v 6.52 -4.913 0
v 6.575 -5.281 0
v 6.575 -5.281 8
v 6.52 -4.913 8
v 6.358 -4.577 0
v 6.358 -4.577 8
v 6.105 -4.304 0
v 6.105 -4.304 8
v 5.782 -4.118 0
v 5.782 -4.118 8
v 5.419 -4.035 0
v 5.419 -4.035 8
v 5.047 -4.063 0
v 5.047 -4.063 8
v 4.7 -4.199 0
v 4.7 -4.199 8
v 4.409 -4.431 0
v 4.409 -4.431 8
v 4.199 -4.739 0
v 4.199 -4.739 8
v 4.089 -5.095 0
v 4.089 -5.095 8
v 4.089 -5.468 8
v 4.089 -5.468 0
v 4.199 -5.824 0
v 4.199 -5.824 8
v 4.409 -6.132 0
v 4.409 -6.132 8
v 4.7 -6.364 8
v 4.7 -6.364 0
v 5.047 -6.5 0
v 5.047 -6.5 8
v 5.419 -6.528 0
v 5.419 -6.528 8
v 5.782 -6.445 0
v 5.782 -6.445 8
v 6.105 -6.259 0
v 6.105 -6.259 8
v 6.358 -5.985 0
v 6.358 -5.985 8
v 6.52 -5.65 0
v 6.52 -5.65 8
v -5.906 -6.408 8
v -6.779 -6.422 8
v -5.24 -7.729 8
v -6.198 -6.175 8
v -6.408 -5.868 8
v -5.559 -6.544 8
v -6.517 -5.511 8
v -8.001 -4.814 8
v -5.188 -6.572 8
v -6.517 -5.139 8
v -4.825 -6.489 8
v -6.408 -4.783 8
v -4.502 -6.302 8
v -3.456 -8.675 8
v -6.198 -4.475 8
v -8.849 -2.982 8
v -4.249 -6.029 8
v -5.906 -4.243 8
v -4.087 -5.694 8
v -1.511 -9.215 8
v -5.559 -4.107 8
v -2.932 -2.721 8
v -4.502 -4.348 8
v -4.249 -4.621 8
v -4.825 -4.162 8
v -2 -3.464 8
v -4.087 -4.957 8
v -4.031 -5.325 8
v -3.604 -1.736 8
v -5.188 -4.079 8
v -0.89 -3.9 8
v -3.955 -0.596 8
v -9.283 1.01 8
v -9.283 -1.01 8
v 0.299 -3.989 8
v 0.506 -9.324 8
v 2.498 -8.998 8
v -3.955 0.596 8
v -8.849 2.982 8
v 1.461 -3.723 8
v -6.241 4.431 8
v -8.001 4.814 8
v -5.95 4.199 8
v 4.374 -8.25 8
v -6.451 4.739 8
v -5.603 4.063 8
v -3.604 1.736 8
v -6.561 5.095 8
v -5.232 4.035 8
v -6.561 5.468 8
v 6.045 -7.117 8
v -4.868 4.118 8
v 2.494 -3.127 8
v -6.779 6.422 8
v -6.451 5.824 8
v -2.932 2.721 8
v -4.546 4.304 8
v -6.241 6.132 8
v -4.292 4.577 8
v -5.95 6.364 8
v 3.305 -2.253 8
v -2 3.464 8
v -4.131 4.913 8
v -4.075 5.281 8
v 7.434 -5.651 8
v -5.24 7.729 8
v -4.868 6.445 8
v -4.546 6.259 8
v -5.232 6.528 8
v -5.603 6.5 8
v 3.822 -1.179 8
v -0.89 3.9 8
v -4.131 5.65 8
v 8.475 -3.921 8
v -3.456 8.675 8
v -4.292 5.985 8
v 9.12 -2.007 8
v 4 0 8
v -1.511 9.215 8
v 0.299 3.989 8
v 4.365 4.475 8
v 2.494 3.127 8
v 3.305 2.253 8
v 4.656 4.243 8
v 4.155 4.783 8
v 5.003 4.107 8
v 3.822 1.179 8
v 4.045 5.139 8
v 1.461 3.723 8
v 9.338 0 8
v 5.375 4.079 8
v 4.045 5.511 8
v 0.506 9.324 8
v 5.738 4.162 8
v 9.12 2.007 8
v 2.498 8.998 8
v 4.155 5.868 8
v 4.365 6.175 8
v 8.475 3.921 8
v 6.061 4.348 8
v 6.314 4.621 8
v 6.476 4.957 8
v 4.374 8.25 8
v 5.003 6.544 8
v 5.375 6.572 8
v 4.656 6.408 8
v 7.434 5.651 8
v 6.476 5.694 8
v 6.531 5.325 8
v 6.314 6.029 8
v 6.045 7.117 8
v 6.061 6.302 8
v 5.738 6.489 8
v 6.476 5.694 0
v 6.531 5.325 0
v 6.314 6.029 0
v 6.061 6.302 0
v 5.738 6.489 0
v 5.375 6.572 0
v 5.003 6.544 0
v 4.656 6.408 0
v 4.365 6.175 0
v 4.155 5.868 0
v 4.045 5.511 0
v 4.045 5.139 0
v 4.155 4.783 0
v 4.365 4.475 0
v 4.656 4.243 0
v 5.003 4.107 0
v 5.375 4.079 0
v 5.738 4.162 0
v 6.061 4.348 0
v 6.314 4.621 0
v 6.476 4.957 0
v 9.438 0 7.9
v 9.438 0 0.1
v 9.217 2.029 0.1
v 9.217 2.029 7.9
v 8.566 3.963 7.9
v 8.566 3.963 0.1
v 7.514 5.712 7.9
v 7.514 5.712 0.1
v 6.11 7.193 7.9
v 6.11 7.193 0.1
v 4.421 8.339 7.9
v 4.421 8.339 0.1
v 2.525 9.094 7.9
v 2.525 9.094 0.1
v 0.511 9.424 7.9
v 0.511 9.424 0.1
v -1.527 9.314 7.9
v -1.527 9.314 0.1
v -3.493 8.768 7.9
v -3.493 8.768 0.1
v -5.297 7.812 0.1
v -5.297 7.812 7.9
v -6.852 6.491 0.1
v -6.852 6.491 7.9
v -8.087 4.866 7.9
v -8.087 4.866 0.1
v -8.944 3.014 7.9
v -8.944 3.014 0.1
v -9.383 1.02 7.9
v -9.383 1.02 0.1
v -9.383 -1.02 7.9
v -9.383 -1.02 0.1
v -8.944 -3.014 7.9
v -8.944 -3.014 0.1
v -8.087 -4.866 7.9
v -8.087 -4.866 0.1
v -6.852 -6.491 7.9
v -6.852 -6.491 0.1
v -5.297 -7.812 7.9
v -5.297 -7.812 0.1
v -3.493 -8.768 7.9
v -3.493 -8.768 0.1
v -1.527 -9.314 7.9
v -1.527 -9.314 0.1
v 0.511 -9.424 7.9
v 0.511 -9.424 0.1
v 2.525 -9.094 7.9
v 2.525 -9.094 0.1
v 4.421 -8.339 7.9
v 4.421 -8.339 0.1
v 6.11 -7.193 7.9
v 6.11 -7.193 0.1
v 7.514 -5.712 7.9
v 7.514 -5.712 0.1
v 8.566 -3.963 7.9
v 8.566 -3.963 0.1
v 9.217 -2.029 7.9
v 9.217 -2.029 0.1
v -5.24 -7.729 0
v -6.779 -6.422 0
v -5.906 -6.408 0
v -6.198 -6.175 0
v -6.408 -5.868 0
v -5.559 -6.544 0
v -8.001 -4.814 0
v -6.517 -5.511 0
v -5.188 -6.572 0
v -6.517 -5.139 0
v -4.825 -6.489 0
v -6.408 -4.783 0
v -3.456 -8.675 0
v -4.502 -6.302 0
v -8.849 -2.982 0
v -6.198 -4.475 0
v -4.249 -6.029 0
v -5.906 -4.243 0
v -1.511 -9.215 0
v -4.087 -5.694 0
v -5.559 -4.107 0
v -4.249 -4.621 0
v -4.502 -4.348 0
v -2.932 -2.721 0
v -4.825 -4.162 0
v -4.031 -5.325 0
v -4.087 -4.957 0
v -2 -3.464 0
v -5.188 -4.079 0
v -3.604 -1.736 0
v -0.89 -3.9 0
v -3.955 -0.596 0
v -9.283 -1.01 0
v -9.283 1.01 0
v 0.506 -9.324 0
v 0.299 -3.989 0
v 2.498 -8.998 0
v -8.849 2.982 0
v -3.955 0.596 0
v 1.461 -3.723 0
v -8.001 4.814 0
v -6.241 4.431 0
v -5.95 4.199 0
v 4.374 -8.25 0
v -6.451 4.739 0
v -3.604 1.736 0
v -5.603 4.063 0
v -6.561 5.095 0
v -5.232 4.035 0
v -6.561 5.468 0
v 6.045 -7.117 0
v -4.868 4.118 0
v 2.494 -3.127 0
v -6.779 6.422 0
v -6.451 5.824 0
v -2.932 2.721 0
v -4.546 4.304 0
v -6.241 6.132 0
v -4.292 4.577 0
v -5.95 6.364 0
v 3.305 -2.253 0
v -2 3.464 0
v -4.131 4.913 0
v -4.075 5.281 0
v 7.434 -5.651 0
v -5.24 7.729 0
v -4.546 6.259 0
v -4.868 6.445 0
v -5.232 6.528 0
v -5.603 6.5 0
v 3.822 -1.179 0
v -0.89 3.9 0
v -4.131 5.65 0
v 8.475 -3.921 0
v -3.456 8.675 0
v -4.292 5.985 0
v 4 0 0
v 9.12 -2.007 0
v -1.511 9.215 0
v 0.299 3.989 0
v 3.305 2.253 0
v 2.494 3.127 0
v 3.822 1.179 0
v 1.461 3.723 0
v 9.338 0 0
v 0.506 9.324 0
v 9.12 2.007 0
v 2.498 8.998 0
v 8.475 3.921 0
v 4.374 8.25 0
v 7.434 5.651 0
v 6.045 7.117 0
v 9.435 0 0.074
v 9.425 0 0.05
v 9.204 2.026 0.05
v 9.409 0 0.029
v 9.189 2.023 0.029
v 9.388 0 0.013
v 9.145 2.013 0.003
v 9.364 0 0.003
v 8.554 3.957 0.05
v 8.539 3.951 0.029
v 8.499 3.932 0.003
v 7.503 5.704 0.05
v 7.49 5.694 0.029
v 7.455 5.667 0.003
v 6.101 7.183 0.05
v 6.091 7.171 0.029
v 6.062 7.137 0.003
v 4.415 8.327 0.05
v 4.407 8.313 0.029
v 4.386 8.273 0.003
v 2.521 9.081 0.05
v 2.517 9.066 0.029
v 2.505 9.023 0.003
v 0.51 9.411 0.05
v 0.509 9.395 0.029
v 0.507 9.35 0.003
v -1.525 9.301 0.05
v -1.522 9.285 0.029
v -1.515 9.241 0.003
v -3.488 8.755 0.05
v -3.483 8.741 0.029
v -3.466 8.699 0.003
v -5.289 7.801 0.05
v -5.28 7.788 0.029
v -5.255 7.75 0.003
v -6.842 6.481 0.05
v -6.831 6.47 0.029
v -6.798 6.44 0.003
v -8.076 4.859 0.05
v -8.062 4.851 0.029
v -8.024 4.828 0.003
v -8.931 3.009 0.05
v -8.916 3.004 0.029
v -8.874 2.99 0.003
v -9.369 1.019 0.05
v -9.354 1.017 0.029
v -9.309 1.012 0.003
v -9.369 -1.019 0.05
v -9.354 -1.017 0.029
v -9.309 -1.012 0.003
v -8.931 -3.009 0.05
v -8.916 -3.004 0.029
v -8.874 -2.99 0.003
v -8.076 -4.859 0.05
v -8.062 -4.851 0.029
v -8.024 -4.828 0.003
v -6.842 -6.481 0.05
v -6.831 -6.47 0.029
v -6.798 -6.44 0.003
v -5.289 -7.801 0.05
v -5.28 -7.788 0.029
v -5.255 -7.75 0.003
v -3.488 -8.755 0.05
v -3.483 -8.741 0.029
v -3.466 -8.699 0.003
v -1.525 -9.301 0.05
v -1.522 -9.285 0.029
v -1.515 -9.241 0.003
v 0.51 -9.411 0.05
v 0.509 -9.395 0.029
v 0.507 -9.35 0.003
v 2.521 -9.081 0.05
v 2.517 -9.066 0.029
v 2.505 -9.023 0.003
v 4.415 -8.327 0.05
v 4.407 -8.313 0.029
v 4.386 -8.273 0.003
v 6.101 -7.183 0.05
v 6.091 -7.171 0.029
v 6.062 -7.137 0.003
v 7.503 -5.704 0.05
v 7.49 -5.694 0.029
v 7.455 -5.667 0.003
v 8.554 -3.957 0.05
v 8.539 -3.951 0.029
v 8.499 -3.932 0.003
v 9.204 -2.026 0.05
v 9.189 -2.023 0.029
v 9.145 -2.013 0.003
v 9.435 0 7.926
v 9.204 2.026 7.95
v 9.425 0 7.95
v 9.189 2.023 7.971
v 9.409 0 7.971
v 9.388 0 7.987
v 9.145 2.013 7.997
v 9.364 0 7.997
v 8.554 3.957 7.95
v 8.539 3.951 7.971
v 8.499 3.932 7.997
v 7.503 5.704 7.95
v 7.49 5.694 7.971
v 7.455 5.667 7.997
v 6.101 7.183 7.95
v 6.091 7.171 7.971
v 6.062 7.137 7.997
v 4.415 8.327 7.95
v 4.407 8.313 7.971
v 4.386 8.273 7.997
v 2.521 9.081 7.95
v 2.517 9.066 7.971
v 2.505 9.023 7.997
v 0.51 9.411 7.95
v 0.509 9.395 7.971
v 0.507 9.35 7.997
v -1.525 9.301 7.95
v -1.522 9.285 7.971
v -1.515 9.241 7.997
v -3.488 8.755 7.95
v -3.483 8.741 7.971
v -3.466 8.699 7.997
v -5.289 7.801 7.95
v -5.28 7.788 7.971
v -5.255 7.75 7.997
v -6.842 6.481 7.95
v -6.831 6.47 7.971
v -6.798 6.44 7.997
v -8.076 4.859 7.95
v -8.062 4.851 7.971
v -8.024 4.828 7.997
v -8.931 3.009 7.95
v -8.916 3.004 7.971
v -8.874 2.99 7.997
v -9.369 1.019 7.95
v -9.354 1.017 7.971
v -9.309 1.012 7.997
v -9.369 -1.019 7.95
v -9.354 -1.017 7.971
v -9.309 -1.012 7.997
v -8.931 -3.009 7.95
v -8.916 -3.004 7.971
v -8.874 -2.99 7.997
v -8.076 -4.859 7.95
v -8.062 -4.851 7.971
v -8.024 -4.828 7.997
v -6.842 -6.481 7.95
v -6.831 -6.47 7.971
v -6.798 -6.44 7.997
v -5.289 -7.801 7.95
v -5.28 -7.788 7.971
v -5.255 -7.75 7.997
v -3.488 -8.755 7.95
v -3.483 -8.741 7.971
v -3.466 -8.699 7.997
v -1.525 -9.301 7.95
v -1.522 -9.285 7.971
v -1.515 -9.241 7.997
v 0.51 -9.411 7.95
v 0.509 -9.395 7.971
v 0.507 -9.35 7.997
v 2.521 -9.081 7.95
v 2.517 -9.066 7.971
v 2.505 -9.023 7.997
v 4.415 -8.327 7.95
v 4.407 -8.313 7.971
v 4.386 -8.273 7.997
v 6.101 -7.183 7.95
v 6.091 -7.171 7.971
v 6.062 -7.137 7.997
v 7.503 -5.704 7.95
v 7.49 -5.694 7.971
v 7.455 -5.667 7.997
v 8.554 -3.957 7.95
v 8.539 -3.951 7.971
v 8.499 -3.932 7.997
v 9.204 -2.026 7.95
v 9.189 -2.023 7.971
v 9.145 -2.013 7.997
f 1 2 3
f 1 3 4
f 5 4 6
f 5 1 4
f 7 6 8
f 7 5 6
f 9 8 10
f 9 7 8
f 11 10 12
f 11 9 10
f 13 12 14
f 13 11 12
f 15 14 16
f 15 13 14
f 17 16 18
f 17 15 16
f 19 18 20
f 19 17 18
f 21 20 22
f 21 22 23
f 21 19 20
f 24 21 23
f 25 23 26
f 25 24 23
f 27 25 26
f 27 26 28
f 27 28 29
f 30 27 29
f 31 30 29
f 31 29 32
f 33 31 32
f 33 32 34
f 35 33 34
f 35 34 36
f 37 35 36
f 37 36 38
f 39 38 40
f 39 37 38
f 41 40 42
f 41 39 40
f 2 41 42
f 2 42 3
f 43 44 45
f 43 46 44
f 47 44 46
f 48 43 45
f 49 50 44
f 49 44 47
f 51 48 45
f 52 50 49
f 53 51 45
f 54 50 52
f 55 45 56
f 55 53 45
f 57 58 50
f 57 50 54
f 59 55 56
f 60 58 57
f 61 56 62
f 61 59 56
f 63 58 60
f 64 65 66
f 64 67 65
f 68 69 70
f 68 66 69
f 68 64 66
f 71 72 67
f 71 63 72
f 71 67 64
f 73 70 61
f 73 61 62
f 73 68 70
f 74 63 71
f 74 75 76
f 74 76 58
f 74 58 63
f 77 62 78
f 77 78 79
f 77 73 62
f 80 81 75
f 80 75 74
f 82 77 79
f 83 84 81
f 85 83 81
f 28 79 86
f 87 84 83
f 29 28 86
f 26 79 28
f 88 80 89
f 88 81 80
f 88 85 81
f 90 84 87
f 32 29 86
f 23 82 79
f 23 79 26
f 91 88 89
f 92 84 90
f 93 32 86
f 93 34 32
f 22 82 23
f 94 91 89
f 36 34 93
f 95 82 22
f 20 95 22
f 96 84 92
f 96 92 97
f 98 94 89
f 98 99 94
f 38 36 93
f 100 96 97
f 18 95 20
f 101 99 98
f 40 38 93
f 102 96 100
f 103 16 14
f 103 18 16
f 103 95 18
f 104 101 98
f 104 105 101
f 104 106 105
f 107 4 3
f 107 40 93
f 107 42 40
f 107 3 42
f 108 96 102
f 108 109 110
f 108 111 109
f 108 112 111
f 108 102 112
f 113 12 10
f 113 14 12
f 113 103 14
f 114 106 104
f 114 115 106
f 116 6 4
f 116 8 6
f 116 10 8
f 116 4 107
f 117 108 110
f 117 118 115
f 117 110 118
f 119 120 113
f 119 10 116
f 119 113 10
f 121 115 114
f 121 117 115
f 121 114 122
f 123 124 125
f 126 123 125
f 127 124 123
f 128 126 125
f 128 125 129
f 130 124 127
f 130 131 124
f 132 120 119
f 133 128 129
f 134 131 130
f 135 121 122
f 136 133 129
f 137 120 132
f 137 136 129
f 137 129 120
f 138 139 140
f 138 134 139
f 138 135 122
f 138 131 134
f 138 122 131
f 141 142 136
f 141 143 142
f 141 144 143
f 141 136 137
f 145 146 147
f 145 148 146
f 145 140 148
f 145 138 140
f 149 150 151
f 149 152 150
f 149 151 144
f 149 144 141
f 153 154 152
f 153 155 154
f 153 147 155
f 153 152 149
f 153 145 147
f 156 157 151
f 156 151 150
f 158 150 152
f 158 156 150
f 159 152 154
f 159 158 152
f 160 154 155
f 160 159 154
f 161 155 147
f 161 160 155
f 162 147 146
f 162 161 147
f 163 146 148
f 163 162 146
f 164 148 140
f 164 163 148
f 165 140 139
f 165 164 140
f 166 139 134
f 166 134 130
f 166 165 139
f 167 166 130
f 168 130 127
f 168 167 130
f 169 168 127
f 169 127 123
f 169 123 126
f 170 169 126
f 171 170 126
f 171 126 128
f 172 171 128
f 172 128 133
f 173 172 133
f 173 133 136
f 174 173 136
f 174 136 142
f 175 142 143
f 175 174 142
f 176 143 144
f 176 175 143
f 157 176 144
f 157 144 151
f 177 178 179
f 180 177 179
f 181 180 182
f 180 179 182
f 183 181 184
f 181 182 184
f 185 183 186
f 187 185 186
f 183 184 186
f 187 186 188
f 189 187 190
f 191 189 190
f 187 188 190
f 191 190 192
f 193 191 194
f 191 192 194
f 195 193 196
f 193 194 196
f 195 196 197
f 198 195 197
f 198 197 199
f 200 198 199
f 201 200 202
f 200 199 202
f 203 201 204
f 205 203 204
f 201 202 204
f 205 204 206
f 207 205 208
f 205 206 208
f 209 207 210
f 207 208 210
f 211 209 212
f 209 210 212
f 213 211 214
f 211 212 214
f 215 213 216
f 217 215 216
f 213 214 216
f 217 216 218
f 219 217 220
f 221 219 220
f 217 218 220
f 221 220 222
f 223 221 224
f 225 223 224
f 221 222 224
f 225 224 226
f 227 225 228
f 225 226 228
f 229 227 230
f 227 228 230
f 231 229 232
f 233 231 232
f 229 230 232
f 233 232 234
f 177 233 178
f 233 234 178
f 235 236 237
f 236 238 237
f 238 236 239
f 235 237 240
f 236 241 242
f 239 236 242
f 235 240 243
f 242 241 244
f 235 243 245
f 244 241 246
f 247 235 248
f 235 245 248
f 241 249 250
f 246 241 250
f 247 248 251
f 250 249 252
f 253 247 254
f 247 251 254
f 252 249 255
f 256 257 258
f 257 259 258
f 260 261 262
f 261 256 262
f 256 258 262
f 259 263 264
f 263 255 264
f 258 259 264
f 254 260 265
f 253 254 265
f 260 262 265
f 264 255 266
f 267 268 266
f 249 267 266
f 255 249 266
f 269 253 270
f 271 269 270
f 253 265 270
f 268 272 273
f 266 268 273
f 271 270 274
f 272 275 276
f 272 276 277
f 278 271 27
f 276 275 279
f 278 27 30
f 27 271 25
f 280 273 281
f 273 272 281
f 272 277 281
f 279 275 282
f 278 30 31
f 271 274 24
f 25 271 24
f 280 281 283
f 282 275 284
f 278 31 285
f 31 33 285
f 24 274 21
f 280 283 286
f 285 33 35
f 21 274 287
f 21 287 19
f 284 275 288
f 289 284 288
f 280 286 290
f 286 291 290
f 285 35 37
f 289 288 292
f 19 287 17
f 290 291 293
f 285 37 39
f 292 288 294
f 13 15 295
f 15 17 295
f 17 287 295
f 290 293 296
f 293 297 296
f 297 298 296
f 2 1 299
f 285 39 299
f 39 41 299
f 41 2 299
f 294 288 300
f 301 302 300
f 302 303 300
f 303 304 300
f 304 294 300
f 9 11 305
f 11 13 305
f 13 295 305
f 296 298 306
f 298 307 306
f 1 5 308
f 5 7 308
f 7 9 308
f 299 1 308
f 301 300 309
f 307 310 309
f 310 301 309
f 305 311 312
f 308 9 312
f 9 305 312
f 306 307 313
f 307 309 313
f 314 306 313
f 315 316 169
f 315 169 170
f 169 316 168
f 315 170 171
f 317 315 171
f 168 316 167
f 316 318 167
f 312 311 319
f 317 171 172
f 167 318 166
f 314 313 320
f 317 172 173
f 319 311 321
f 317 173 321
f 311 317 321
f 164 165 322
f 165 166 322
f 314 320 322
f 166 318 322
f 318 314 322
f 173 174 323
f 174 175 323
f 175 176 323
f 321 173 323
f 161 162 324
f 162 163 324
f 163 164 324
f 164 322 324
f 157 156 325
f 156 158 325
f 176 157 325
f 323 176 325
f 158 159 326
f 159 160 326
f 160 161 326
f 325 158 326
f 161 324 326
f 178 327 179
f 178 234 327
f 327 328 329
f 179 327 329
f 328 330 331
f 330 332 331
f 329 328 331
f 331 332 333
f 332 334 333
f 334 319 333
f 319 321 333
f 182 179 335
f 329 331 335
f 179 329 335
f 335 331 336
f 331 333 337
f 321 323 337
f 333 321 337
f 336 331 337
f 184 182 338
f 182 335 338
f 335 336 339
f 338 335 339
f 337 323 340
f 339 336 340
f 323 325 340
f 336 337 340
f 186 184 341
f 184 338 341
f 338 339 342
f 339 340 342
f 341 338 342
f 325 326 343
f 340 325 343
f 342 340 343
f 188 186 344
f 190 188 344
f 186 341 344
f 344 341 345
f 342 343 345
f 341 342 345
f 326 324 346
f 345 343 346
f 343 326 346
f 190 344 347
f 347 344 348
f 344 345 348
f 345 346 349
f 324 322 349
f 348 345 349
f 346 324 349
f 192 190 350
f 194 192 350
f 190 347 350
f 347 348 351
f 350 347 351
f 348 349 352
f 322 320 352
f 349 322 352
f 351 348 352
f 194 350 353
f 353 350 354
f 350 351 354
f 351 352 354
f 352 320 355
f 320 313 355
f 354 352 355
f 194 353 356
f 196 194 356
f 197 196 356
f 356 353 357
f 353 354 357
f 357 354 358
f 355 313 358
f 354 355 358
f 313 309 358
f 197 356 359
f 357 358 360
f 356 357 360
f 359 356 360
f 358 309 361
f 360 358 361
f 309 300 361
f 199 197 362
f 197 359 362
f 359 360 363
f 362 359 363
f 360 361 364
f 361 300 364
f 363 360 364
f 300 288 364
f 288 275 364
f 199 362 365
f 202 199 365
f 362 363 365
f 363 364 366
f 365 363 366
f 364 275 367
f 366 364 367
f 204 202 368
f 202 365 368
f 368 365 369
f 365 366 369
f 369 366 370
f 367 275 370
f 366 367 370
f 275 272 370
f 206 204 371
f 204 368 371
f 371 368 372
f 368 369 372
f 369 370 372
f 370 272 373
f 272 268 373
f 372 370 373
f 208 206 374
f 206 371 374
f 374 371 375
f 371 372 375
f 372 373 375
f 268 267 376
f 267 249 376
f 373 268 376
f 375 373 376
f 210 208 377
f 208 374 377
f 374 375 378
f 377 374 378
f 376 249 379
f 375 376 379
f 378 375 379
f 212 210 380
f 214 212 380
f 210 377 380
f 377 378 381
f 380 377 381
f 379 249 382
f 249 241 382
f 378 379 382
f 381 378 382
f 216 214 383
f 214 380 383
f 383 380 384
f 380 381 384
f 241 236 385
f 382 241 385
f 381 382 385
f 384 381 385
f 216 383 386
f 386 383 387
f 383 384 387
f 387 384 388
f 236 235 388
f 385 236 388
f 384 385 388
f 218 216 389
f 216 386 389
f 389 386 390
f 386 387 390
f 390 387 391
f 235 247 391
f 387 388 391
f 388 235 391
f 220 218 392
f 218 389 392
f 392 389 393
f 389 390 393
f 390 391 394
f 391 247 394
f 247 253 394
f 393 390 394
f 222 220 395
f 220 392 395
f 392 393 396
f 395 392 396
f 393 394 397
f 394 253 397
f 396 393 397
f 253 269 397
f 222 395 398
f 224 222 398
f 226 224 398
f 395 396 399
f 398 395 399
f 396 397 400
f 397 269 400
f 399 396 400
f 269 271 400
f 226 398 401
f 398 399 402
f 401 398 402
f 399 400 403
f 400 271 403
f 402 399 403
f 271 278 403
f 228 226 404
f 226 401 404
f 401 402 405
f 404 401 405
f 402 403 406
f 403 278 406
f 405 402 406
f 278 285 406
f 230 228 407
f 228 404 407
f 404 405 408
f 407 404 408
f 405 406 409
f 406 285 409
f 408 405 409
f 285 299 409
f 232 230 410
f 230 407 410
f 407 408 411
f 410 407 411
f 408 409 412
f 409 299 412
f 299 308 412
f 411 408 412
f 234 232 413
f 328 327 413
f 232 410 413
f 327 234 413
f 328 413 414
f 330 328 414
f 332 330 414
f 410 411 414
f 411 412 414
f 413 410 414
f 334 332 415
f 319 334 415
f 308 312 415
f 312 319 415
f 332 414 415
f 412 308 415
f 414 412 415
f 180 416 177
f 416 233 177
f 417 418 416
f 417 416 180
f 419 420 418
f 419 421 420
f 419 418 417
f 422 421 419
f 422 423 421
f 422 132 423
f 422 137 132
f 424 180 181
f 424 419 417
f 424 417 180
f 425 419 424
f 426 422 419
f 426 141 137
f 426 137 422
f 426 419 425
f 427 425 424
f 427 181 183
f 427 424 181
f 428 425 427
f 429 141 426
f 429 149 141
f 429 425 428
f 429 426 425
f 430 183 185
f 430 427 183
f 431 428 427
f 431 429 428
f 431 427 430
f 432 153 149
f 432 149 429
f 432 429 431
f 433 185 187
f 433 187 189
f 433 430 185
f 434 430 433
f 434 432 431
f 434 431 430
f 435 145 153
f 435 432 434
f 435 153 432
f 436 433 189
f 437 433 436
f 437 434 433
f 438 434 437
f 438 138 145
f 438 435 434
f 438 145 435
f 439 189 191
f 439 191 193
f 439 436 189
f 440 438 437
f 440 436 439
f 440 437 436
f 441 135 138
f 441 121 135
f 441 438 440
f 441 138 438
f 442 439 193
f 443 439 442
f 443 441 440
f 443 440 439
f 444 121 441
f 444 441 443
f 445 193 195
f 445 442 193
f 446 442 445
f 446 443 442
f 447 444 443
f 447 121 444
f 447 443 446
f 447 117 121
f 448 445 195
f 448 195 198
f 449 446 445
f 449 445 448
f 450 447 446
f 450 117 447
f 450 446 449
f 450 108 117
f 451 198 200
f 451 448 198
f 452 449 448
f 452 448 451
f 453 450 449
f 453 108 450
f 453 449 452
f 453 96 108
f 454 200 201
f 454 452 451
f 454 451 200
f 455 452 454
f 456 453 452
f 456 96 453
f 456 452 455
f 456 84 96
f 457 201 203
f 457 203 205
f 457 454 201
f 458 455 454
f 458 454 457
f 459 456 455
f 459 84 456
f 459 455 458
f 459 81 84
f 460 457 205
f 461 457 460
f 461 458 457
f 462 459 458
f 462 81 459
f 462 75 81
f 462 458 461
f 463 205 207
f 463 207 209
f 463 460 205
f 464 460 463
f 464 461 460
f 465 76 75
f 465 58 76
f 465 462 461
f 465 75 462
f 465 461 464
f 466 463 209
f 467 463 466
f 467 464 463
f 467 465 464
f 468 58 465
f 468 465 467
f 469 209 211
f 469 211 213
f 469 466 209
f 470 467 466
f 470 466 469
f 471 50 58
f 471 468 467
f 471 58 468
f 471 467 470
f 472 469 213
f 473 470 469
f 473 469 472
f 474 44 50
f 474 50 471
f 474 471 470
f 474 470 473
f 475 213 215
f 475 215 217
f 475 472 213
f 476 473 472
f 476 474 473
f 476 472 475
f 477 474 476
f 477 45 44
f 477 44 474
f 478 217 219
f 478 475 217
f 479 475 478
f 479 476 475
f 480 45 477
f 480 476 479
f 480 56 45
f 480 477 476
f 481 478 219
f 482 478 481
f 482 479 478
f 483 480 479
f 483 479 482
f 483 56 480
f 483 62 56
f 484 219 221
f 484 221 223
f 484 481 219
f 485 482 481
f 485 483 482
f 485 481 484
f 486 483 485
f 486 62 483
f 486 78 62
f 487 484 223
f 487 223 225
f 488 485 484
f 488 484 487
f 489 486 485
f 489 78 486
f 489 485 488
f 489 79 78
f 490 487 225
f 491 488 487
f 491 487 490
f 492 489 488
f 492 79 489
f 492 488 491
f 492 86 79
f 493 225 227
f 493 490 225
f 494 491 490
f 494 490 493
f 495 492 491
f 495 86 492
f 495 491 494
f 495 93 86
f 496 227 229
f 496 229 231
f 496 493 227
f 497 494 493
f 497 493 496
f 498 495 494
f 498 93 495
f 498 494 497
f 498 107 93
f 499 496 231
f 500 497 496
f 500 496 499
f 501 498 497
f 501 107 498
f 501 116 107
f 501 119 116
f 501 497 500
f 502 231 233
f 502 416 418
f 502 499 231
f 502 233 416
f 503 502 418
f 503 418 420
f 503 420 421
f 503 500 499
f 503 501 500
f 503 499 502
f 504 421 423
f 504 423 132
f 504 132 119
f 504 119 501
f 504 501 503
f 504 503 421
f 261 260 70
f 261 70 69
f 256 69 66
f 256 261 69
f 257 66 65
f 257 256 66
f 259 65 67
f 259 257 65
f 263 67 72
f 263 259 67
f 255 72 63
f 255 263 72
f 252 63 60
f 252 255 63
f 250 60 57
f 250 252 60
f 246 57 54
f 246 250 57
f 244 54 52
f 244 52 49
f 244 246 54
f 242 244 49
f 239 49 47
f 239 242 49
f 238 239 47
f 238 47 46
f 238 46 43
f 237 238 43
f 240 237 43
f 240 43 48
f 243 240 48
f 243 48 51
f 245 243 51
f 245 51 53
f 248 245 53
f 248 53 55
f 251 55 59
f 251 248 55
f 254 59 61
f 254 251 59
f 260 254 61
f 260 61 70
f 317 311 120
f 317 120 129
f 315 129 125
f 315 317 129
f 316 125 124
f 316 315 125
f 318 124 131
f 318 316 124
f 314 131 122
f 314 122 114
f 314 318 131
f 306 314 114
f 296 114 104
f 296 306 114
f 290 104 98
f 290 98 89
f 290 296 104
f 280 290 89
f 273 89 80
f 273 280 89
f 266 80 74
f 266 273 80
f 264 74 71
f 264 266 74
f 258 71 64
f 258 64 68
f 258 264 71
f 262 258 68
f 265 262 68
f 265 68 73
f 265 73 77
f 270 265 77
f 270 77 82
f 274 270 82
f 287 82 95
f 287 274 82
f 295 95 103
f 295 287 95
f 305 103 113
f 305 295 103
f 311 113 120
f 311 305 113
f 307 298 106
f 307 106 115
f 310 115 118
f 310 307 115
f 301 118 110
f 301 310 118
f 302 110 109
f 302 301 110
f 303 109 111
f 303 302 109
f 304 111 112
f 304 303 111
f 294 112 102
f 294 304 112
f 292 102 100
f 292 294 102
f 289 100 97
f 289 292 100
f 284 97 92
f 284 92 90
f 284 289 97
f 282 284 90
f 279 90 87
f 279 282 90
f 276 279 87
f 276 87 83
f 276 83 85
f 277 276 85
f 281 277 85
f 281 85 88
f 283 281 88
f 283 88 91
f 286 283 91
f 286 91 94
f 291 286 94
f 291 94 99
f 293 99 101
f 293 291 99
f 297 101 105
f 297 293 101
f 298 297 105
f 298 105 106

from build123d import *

# Parameters (mm, degrees)
SKETCH_1_R      = 9.43812854
SKETCH_1_R_2    = 4
SKETCH_1_R_3    = 1.25
EXTRUDE_1_DEPTH = 8
FILLET_1_R      = 0.1


with BuildPart() as part:
    # Эскиз1 → Бобышка-Вытянуть1 (new body)
    with BuildSketch(Plane.XY):
        Circle(SKETCH_1_R)
        Circle(SKETCH_1_R_2, mode=Mode.SUBTRACT)
        with Locations((-5.325171984, 5.281339162)):
            Circle(SKETCH_1_R_3, mode=Mode.SUBTRACT)
        with Locations((-5.281339162, -5.325171984)):
            Circle(SKETCH_1_R_3, mode=Mode.SUBTRACT)
        with Locations((5.325171984, -5.281339162)):
            Circle(SKETCH_1_R_3, mode=Mode.SUBTRACT)
        with Locations((5.281339162, 5.325171984)):
            Circle(SKETCH_1_R_3, mode=Mode.SUBTRACT)
    extrude(amount=EXTRUDE_1_DEPTH)

    # Скругление1
    fillet_1_edges = [part.edges().sort_by_distance(p)[0] for p in [
        (-9.43812854, 0, 0),
        (-9.43812854, 0, 8),
    ]]
    fillet(fillet_1_edges, radius=FILLET_1_R)


solid = part.part
